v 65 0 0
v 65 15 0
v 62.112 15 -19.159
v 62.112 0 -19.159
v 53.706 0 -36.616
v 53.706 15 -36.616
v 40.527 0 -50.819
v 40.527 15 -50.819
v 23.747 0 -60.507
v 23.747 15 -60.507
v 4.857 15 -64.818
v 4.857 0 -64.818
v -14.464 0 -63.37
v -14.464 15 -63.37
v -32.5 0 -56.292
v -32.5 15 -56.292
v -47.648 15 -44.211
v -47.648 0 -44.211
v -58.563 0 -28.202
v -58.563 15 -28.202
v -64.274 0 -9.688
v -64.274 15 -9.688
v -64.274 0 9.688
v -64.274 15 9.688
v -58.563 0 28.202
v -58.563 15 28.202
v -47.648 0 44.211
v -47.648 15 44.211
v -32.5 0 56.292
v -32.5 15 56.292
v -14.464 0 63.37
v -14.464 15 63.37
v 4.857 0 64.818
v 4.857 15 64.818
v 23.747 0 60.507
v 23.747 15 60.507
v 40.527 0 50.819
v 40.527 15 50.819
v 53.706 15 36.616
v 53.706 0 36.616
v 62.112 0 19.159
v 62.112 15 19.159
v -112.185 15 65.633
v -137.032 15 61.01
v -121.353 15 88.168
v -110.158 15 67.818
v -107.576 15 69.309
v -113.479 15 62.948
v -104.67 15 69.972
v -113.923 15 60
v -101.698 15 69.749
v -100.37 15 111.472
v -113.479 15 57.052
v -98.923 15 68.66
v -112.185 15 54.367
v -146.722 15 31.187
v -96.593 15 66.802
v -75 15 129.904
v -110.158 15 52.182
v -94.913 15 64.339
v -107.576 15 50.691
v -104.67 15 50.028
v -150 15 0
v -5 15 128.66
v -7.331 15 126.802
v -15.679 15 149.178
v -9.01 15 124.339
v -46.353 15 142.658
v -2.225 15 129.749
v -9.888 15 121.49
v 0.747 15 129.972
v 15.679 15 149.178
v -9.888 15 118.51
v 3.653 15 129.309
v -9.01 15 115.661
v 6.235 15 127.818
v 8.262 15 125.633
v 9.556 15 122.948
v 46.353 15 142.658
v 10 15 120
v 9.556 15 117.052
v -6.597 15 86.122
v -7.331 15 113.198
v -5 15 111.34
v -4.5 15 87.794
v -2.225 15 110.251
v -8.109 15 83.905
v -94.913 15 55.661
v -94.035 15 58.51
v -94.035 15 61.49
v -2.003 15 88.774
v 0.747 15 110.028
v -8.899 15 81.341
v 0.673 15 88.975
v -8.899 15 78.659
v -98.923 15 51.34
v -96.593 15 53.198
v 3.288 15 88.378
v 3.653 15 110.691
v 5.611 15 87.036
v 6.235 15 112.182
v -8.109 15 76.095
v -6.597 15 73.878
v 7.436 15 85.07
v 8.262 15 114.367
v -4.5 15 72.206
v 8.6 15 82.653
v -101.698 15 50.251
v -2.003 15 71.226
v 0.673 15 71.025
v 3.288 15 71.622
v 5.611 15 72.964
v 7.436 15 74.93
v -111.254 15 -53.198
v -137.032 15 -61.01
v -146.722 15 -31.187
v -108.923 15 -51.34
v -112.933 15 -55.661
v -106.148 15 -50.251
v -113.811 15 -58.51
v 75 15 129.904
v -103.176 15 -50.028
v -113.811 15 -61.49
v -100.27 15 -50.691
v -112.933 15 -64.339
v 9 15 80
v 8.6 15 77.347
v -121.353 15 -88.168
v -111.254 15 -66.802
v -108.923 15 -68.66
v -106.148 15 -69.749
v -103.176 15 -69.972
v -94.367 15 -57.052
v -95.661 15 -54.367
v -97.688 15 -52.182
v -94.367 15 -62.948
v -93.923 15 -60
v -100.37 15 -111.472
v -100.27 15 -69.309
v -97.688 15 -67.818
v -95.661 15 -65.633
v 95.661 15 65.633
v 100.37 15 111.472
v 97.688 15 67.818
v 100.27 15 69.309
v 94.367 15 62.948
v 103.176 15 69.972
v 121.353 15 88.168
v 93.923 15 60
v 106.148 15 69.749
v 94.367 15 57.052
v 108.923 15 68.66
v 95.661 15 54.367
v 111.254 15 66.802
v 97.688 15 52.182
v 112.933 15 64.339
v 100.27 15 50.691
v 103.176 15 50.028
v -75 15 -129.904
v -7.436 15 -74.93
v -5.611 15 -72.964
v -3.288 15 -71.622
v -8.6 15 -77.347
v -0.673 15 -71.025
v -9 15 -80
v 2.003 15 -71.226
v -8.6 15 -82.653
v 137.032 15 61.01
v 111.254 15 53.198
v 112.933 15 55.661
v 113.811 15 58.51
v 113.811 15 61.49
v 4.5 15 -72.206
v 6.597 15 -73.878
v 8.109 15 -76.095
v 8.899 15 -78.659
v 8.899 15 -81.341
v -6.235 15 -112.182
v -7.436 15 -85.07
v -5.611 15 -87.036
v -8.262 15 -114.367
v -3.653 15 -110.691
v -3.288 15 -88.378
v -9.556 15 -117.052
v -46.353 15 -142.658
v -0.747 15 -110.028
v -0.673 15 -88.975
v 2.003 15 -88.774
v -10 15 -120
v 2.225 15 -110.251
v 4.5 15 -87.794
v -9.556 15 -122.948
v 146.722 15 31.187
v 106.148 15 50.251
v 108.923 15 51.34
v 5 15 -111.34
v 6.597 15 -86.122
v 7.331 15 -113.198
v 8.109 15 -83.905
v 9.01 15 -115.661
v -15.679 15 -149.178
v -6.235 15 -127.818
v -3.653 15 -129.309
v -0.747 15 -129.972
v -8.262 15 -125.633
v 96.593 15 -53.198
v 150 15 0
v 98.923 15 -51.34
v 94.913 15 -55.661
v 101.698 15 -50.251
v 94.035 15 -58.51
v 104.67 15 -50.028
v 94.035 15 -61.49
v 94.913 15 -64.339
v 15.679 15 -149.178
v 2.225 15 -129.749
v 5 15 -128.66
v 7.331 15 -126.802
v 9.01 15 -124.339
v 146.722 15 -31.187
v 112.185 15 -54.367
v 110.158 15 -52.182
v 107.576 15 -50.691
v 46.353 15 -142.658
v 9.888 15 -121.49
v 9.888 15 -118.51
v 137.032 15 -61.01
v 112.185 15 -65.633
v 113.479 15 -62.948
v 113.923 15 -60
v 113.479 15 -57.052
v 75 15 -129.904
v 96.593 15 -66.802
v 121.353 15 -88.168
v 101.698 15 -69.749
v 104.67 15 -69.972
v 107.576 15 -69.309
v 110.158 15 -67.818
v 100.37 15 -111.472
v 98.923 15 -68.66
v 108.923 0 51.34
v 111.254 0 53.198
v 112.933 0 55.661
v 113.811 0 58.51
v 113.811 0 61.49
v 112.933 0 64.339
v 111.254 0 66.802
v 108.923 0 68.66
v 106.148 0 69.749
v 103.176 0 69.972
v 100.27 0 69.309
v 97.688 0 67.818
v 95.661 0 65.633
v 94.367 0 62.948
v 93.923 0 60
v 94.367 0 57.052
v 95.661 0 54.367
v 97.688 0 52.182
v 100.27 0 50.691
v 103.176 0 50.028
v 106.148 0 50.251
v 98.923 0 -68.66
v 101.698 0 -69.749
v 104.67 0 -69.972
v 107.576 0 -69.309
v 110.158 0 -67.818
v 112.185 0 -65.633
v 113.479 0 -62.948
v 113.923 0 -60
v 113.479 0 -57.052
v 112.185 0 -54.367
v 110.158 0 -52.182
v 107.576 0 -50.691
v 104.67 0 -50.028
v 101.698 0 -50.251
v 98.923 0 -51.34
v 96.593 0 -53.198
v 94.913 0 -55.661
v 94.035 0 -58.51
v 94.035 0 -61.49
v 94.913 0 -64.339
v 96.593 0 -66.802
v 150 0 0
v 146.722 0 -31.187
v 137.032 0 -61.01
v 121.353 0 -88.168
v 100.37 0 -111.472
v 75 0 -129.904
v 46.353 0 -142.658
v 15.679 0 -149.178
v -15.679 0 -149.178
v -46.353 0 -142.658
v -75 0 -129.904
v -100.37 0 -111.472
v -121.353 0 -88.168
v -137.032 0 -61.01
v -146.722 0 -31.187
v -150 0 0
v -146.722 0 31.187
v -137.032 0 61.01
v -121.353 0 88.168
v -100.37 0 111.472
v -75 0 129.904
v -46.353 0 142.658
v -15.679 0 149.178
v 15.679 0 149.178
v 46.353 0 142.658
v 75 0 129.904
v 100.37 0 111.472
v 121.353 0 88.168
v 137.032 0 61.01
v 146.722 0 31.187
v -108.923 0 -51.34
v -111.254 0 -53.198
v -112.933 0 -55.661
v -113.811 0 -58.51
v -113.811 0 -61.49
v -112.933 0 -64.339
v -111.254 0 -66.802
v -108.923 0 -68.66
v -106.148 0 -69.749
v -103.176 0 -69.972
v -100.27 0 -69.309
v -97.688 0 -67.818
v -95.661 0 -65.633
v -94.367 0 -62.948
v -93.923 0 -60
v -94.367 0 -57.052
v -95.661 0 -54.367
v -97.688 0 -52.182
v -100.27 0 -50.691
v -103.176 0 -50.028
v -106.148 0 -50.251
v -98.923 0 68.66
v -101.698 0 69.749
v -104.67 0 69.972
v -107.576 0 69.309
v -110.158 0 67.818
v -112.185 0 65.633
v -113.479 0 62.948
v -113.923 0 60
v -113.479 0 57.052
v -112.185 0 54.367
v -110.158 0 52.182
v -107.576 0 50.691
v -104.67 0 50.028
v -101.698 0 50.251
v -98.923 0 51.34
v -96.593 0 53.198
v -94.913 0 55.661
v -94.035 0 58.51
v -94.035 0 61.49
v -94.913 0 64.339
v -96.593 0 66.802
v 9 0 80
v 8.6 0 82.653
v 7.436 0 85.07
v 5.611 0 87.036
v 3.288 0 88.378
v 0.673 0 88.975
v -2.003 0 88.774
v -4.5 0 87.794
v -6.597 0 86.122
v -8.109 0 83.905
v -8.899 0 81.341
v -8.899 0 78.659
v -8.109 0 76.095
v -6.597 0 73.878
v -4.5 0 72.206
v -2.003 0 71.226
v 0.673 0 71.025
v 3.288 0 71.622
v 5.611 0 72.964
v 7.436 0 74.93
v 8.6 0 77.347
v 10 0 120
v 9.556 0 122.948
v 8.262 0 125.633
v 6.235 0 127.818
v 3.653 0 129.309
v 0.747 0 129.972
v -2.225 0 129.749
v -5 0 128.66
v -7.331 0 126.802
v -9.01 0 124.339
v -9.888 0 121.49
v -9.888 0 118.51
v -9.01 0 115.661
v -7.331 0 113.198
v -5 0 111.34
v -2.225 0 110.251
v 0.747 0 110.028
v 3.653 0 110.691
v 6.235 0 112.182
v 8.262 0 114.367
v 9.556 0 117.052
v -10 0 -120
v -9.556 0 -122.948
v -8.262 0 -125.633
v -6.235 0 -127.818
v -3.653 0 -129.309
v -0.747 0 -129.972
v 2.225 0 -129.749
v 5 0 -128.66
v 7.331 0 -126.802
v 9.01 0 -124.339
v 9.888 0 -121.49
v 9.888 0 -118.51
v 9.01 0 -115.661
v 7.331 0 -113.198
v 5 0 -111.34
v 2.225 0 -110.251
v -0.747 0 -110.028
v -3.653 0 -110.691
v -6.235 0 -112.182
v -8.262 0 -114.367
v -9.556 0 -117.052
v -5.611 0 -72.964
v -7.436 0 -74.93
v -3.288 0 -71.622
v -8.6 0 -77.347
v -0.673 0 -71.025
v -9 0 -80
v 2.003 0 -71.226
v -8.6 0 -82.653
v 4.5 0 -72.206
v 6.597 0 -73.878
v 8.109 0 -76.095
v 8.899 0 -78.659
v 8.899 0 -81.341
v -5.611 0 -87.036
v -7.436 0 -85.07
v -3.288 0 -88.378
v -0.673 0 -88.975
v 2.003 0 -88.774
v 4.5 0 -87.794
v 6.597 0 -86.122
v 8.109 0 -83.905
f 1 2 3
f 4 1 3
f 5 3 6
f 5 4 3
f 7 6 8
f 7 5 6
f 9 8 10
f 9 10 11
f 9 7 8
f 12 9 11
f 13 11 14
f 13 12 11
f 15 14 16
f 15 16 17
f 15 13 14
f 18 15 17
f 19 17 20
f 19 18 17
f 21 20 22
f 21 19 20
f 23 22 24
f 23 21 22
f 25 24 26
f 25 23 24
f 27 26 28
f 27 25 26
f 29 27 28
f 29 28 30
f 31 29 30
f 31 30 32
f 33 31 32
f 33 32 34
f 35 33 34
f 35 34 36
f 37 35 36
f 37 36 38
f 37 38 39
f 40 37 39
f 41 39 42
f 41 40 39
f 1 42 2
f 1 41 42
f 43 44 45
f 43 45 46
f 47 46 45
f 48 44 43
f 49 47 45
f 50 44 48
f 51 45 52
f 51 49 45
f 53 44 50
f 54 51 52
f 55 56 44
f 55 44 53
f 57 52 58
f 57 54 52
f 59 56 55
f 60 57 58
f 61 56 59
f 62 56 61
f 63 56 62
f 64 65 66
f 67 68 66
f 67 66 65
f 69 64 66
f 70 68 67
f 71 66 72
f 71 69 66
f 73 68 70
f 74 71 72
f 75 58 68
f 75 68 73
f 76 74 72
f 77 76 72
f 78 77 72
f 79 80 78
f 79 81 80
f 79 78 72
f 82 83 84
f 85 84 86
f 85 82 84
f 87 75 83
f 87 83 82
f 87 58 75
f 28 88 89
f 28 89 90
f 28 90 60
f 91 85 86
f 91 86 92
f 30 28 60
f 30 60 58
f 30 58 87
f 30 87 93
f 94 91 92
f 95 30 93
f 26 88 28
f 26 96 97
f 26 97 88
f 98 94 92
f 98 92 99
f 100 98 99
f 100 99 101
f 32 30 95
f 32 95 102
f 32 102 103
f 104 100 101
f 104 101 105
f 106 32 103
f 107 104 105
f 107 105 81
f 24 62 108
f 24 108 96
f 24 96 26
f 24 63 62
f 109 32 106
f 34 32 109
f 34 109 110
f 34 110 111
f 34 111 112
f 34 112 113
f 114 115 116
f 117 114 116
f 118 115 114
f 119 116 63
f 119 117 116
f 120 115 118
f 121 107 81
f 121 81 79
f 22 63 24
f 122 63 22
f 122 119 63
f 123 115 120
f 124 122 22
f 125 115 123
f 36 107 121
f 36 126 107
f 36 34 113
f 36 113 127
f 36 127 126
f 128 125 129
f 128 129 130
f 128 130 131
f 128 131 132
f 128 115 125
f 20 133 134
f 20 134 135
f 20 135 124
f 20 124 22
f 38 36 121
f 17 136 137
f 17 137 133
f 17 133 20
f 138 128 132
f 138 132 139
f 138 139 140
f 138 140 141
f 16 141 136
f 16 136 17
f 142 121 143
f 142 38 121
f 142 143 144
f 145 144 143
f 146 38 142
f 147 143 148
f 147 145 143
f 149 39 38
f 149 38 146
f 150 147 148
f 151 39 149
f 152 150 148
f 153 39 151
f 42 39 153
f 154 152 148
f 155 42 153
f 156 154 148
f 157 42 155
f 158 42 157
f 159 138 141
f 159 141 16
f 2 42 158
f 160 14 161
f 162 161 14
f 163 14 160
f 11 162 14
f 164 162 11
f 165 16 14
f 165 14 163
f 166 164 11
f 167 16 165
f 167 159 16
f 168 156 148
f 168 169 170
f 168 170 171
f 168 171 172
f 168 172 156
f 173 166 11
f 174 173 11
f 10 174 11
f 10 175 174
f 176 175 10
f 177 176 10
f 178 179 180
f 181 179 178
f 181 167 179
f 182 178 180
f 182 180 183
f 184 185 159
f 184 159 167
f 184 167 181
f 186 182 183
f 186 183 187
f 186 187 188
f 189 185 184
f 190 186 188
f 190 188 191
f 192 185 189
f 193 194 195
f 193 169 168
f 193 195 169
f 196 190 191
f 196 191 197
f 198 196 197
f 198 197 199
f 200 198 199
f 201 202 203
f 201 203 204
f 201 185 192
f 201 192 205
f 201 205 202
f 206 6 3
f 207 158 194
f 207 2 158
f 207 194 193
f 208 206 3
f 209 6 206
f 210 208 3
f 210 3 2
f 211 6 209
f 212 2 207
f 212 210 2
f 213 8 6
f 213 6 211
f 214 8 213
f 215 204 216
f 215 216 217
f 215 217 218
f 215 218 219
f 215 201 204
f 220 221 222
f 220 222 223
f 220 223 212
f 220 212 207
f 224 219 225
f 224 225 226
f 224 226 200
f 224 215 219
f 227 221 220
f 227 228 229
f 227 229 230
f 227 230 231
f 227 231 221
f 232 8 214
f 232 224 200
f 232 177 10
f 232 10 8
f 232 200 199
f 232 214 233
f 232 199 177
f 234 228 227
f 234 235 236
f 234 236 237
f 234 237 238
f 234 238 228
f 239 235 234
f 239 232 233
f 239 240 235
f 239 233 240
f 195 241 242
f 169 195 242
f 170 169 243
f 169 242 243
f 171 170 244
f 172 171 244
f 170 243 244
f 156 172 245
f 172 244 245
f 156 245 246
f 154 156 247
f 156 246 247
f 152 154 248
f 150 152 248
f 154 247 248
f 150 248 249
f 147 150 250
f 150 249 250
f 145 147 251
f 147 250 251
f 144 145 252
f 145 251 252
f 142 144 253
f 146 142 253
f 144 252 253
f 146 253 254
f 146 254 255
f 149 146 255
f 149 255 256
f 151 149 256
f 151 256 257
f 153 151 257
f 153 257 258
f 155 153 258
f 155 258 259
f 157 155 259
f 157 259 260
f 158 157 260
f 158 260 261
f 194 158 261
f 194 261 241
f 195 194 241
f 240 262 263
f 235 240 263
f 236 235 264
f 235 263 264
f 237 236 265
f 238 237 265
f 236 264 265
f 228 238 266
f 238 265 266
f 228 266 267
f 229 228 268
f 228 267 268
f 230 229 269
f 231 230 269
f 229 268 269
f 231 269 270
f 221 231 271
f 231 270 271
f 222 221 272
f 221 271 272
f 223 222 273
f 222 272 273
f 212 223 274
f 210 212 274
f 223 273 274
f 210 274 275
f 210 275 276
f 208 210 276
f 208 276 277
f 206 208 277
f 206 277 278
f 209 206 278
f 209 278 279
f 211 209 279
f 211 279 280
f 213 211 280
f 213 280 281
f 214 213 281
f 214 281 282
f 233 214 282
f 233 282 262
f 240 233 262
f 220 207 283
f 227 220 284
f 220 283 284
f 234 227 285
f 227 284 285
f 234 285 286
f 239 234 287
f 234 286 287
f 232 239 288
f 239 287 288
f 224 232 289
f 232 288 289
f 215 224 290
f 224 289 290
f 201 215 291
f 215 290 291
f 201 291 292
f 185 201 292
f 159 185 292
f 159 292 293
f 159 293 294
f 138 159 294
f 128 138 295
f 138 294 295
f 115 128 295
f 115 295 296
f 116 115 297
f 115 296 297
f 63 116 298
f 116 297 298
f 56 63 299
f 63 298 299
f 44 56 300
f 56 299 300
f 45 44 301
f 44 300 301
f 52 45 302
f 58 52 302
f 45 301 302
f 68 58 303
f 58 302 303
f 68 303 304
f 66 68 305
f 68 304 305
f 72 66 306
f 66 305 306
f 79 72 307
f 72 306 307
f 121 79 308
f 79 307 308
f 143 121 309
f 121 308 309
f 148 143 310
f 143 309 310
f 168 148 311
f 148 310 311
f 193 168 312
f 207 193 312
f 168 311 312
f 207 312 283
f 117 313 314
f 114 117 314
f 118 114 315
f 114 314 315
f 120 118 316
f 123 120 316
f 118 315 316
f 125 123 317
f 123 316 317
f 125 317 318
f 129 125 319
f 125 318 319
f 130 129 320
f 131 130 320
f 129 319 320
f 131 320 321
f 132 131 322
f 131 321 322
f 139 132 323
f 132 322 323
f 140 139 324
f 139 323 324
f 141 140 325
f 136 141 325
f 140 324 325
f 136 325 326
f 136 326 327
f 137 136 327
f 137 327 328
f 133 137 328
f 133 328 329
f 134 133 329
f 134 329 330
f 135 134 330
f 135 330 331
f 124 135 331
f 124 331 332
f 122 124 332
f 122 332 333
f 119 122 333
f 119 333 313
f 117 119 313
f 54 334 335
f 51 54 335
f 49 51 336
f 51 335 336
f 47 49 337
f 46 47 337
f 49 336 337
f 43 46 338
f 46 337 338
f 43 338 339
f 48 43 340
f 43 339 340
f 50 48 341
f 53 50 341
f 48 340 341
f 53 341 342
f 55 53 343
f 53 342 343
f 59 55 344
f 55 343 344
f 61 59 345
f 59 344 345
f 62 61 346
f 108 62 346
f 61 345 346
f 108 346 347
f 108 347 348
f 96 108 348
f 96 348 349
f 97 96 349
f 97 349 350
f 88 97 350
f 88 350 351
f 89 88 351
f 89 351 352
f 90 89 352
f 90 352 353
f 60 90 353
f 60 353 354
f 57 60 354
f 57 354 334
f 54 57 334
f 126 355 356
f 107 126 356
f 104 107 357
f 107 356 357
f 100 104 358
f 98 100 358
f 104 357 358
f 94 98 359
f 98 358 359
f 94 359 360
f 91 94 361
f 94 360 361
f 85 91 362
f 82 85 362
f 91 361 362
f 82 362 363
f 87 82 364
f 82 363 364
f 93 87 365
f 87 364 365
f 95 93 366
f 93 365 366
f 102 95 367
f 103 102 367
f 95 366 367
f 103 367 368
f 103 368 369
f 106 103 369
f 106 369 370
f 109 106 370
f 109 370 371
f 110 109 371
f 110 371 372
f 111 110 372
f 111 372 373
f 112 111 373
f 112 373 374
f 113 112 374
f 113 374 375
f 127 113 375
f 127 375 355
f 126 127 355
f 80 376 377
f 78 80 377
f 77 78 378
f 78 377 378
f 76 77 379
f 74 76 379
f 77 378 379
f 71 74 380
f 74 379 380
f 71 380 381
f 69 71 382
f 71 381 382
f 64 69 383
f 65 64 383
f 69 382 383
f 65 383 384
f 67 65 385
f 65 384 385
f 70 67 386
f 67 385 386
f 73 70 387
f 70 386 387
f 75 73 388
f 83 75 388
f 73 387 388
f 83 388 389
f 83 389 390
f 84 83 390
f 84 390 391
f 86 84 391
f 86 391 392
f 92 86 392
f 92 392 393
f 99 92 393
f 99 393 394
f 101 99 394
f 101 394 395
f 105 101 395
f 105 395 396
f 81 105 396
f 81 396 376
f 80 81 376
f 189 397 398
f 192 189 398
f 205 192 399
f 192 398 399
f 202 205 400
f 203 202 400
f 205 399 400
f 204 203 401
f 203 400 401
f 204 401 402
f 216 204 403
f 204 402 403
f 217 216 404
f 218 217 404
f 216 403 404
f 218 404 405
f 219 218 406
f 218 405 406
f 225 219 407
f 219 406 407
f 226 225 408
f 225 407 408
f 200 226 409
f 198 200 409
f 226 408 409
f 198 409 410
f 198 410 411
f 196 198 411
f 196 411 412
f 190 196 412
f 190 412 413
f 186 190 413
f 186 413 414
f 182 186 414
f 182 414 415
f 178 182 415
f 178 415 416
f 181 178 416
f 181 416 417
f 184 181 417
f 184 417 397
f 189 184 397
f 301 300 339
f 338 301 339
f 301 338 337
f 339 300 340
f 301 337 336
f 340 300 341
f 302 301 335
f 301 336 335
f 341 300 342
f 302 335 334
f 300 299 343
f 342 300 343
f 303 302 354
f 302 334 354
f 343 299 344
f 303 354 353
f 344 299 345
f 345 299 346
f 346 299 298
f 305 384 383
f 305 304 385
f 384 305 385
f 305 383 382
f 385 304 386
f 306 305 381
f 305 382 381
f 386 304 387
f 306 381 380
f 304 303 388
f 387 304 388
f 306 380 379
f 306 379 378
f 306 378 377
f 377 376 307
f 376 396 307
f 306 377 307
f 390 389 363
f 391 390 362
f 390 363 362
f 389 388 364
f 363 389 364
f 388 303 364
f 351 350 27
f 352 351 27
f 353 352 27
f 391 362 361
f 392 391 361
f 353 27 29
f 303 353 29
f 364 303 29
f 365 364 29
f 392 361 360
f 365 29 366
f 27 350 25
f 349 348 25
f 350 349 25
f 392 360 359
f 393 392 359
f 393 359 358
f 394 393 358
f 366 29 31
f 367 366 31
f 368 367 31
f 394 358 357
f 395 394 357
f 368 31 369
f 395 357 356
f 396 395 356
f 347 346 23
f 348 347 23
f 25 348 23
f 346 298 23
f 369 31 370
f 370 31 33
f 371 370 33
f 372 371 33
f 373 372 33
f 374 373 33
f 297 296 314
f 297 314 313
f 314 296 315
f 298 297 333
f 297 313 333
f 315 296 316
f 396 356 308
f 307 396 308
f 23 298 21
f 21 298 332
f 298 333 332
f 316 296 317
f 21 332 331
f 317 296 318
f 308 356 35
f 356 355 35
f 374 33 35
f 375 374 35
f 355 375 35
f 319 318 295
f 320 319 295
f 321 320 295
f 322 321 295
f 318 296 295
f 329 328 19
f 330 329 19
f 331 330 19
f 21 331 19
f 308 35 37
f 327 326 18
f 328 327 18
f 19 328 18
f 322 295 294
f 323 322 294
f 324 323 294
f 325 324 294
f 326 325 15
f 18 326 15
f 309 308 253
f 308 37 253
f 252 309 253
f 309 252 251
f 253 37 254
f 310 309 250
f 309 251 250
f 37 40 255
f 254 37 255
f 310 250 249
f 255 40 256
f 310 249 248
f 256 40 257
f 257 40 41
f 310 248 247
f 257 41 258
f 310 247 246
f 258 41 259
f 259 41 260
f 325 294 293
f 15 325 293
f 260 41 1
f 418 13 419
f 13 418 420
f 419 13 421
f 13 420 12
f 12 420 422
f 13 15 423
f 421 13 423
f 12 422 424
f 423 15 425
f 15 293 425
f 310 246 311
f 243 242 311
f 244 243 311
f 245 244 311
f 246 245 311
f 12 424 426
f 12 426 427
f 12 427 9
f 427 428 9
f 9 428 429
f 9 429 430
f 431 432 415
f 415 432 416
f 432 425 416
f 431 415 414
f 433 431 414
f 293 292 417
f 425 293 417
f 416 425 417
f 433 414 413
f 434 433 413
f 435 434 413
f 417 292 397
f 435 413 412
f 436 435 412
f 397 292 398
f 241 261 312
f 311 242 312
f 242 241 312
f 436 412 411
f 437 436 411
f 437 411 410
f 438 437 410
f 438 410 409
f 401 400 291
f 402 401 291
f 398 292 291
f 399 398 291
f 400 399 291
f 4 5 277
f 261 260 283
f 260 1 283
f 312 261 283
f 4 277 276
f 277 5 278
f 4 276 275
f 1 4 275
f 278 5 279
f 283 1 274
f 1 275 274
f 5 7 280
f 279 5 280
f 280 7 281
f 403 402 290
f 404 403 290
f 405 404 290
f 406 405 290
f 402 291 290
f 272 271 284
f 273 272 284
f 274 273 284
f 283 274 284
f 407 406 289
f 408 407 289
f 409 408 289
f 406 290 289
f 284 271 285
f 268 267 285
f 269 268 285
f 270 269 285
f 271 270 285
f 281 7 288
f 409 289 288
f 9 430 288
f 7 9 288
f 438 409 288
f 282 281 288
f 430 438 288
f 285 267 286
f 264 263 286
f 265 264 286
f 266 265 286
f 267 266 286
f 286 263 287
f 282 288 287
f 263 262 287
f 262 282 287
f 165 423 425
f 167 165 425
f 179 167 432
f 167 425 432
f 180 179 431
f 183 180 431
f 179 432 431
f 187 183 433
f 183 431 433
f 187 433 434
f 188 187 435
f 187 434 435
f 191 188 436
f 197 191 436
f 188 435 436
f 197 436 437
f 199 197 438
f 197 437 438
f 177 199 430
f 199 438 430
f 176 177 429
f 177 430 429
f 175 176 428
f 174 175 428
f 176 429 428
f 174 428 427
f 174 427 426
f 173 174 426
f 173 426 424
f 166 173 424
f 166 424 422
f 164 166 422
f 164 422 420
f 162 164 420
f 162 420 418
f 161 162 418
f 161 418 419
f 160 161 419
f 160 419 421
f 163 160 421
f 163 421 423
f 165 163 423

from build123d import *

# Parameters (mm, degrees)
SKETCH2_R                    = 150
SKETCH2_R_2                  = 65
BOSS_EXTRUDE1_DEPTH          = 15
TAP_DRILL_FOR_M14X2_0_TAP1_D = 20
CIRPATTERN1_COUNT            = 6
TAP_DRILL_FOR_M14X2_0_TAP2_D = 18
CIRPATTERN2_COUNT            = 2


with BuildPart() as part:
    # Sketch2 → Boss-Extrude1 (new body)
    with BuildSketch(Plane(origin=(0, 0, 0), x_dir=(1, 0, 0), z_dir=(0, 1, 0))):
        Circle(SKETCH2_R)
        Circle(SKETCH2_R_2, mode=Mode.SUBTRACT)
    extrude(amount=BOSS_EXTRUDE1_DEPTH)

    # Tap Drill for M14x2.0 Tap1 (through all)
    with Locations(Plane(origin=(0, 15, 0), x_dir=(1, 0, 0), z_dir=(0, 1, 0))):
        with Locations((0, 120)):
            tap_drill_for_m14x2_0_tap1 = Hole(TAP_DRILL_FOR_M14X2_0_TAP1_D / 2)

    # CirPattern1: Tap Drill for M14x2.0 Tap1 ×6 about axis
    cirpattern1_axis = Axis((0, -0.75, 0), (0, 1, 0))
    for i in range(1, CIRPATTERN1_COUNT):
        add(tap_drill_for_m14x2_0_tap1.rotate(cirpattern1_axis, i * 360 / CIRPATTERN1_COUNT), mode=Mode.SUBTRACT)

    # Tap Drill for M14x2.0 Tap2 (through all)
    with Locations(Plane(origin=(0, 15, 0), x_dir=(1, 0, 0), z_dir=(0, 1, 0))):
        with Locations((0, 80)):
            tap_drill_for_m14x2_0_tap2 = Hole(TAP_DRILL_FOR_M14X2_0_TAP2_D / 2)

    # CirPattern2: Tap Drill for M14x2.0 Tap2 ×2 about axis
    cirpattern2_axis = Axis((0, -0.75, 0), (0, 1, 0))
    for i in range(1, CIRPATTERN2_COUNT):
        add(tap_drill_for_m14x2_0_tap2.rotate(cirpattern2_axis, i * 360 / CIRPATTERN2_COUNT), mode=Mode.SUBTRACT)


solid = part.part
